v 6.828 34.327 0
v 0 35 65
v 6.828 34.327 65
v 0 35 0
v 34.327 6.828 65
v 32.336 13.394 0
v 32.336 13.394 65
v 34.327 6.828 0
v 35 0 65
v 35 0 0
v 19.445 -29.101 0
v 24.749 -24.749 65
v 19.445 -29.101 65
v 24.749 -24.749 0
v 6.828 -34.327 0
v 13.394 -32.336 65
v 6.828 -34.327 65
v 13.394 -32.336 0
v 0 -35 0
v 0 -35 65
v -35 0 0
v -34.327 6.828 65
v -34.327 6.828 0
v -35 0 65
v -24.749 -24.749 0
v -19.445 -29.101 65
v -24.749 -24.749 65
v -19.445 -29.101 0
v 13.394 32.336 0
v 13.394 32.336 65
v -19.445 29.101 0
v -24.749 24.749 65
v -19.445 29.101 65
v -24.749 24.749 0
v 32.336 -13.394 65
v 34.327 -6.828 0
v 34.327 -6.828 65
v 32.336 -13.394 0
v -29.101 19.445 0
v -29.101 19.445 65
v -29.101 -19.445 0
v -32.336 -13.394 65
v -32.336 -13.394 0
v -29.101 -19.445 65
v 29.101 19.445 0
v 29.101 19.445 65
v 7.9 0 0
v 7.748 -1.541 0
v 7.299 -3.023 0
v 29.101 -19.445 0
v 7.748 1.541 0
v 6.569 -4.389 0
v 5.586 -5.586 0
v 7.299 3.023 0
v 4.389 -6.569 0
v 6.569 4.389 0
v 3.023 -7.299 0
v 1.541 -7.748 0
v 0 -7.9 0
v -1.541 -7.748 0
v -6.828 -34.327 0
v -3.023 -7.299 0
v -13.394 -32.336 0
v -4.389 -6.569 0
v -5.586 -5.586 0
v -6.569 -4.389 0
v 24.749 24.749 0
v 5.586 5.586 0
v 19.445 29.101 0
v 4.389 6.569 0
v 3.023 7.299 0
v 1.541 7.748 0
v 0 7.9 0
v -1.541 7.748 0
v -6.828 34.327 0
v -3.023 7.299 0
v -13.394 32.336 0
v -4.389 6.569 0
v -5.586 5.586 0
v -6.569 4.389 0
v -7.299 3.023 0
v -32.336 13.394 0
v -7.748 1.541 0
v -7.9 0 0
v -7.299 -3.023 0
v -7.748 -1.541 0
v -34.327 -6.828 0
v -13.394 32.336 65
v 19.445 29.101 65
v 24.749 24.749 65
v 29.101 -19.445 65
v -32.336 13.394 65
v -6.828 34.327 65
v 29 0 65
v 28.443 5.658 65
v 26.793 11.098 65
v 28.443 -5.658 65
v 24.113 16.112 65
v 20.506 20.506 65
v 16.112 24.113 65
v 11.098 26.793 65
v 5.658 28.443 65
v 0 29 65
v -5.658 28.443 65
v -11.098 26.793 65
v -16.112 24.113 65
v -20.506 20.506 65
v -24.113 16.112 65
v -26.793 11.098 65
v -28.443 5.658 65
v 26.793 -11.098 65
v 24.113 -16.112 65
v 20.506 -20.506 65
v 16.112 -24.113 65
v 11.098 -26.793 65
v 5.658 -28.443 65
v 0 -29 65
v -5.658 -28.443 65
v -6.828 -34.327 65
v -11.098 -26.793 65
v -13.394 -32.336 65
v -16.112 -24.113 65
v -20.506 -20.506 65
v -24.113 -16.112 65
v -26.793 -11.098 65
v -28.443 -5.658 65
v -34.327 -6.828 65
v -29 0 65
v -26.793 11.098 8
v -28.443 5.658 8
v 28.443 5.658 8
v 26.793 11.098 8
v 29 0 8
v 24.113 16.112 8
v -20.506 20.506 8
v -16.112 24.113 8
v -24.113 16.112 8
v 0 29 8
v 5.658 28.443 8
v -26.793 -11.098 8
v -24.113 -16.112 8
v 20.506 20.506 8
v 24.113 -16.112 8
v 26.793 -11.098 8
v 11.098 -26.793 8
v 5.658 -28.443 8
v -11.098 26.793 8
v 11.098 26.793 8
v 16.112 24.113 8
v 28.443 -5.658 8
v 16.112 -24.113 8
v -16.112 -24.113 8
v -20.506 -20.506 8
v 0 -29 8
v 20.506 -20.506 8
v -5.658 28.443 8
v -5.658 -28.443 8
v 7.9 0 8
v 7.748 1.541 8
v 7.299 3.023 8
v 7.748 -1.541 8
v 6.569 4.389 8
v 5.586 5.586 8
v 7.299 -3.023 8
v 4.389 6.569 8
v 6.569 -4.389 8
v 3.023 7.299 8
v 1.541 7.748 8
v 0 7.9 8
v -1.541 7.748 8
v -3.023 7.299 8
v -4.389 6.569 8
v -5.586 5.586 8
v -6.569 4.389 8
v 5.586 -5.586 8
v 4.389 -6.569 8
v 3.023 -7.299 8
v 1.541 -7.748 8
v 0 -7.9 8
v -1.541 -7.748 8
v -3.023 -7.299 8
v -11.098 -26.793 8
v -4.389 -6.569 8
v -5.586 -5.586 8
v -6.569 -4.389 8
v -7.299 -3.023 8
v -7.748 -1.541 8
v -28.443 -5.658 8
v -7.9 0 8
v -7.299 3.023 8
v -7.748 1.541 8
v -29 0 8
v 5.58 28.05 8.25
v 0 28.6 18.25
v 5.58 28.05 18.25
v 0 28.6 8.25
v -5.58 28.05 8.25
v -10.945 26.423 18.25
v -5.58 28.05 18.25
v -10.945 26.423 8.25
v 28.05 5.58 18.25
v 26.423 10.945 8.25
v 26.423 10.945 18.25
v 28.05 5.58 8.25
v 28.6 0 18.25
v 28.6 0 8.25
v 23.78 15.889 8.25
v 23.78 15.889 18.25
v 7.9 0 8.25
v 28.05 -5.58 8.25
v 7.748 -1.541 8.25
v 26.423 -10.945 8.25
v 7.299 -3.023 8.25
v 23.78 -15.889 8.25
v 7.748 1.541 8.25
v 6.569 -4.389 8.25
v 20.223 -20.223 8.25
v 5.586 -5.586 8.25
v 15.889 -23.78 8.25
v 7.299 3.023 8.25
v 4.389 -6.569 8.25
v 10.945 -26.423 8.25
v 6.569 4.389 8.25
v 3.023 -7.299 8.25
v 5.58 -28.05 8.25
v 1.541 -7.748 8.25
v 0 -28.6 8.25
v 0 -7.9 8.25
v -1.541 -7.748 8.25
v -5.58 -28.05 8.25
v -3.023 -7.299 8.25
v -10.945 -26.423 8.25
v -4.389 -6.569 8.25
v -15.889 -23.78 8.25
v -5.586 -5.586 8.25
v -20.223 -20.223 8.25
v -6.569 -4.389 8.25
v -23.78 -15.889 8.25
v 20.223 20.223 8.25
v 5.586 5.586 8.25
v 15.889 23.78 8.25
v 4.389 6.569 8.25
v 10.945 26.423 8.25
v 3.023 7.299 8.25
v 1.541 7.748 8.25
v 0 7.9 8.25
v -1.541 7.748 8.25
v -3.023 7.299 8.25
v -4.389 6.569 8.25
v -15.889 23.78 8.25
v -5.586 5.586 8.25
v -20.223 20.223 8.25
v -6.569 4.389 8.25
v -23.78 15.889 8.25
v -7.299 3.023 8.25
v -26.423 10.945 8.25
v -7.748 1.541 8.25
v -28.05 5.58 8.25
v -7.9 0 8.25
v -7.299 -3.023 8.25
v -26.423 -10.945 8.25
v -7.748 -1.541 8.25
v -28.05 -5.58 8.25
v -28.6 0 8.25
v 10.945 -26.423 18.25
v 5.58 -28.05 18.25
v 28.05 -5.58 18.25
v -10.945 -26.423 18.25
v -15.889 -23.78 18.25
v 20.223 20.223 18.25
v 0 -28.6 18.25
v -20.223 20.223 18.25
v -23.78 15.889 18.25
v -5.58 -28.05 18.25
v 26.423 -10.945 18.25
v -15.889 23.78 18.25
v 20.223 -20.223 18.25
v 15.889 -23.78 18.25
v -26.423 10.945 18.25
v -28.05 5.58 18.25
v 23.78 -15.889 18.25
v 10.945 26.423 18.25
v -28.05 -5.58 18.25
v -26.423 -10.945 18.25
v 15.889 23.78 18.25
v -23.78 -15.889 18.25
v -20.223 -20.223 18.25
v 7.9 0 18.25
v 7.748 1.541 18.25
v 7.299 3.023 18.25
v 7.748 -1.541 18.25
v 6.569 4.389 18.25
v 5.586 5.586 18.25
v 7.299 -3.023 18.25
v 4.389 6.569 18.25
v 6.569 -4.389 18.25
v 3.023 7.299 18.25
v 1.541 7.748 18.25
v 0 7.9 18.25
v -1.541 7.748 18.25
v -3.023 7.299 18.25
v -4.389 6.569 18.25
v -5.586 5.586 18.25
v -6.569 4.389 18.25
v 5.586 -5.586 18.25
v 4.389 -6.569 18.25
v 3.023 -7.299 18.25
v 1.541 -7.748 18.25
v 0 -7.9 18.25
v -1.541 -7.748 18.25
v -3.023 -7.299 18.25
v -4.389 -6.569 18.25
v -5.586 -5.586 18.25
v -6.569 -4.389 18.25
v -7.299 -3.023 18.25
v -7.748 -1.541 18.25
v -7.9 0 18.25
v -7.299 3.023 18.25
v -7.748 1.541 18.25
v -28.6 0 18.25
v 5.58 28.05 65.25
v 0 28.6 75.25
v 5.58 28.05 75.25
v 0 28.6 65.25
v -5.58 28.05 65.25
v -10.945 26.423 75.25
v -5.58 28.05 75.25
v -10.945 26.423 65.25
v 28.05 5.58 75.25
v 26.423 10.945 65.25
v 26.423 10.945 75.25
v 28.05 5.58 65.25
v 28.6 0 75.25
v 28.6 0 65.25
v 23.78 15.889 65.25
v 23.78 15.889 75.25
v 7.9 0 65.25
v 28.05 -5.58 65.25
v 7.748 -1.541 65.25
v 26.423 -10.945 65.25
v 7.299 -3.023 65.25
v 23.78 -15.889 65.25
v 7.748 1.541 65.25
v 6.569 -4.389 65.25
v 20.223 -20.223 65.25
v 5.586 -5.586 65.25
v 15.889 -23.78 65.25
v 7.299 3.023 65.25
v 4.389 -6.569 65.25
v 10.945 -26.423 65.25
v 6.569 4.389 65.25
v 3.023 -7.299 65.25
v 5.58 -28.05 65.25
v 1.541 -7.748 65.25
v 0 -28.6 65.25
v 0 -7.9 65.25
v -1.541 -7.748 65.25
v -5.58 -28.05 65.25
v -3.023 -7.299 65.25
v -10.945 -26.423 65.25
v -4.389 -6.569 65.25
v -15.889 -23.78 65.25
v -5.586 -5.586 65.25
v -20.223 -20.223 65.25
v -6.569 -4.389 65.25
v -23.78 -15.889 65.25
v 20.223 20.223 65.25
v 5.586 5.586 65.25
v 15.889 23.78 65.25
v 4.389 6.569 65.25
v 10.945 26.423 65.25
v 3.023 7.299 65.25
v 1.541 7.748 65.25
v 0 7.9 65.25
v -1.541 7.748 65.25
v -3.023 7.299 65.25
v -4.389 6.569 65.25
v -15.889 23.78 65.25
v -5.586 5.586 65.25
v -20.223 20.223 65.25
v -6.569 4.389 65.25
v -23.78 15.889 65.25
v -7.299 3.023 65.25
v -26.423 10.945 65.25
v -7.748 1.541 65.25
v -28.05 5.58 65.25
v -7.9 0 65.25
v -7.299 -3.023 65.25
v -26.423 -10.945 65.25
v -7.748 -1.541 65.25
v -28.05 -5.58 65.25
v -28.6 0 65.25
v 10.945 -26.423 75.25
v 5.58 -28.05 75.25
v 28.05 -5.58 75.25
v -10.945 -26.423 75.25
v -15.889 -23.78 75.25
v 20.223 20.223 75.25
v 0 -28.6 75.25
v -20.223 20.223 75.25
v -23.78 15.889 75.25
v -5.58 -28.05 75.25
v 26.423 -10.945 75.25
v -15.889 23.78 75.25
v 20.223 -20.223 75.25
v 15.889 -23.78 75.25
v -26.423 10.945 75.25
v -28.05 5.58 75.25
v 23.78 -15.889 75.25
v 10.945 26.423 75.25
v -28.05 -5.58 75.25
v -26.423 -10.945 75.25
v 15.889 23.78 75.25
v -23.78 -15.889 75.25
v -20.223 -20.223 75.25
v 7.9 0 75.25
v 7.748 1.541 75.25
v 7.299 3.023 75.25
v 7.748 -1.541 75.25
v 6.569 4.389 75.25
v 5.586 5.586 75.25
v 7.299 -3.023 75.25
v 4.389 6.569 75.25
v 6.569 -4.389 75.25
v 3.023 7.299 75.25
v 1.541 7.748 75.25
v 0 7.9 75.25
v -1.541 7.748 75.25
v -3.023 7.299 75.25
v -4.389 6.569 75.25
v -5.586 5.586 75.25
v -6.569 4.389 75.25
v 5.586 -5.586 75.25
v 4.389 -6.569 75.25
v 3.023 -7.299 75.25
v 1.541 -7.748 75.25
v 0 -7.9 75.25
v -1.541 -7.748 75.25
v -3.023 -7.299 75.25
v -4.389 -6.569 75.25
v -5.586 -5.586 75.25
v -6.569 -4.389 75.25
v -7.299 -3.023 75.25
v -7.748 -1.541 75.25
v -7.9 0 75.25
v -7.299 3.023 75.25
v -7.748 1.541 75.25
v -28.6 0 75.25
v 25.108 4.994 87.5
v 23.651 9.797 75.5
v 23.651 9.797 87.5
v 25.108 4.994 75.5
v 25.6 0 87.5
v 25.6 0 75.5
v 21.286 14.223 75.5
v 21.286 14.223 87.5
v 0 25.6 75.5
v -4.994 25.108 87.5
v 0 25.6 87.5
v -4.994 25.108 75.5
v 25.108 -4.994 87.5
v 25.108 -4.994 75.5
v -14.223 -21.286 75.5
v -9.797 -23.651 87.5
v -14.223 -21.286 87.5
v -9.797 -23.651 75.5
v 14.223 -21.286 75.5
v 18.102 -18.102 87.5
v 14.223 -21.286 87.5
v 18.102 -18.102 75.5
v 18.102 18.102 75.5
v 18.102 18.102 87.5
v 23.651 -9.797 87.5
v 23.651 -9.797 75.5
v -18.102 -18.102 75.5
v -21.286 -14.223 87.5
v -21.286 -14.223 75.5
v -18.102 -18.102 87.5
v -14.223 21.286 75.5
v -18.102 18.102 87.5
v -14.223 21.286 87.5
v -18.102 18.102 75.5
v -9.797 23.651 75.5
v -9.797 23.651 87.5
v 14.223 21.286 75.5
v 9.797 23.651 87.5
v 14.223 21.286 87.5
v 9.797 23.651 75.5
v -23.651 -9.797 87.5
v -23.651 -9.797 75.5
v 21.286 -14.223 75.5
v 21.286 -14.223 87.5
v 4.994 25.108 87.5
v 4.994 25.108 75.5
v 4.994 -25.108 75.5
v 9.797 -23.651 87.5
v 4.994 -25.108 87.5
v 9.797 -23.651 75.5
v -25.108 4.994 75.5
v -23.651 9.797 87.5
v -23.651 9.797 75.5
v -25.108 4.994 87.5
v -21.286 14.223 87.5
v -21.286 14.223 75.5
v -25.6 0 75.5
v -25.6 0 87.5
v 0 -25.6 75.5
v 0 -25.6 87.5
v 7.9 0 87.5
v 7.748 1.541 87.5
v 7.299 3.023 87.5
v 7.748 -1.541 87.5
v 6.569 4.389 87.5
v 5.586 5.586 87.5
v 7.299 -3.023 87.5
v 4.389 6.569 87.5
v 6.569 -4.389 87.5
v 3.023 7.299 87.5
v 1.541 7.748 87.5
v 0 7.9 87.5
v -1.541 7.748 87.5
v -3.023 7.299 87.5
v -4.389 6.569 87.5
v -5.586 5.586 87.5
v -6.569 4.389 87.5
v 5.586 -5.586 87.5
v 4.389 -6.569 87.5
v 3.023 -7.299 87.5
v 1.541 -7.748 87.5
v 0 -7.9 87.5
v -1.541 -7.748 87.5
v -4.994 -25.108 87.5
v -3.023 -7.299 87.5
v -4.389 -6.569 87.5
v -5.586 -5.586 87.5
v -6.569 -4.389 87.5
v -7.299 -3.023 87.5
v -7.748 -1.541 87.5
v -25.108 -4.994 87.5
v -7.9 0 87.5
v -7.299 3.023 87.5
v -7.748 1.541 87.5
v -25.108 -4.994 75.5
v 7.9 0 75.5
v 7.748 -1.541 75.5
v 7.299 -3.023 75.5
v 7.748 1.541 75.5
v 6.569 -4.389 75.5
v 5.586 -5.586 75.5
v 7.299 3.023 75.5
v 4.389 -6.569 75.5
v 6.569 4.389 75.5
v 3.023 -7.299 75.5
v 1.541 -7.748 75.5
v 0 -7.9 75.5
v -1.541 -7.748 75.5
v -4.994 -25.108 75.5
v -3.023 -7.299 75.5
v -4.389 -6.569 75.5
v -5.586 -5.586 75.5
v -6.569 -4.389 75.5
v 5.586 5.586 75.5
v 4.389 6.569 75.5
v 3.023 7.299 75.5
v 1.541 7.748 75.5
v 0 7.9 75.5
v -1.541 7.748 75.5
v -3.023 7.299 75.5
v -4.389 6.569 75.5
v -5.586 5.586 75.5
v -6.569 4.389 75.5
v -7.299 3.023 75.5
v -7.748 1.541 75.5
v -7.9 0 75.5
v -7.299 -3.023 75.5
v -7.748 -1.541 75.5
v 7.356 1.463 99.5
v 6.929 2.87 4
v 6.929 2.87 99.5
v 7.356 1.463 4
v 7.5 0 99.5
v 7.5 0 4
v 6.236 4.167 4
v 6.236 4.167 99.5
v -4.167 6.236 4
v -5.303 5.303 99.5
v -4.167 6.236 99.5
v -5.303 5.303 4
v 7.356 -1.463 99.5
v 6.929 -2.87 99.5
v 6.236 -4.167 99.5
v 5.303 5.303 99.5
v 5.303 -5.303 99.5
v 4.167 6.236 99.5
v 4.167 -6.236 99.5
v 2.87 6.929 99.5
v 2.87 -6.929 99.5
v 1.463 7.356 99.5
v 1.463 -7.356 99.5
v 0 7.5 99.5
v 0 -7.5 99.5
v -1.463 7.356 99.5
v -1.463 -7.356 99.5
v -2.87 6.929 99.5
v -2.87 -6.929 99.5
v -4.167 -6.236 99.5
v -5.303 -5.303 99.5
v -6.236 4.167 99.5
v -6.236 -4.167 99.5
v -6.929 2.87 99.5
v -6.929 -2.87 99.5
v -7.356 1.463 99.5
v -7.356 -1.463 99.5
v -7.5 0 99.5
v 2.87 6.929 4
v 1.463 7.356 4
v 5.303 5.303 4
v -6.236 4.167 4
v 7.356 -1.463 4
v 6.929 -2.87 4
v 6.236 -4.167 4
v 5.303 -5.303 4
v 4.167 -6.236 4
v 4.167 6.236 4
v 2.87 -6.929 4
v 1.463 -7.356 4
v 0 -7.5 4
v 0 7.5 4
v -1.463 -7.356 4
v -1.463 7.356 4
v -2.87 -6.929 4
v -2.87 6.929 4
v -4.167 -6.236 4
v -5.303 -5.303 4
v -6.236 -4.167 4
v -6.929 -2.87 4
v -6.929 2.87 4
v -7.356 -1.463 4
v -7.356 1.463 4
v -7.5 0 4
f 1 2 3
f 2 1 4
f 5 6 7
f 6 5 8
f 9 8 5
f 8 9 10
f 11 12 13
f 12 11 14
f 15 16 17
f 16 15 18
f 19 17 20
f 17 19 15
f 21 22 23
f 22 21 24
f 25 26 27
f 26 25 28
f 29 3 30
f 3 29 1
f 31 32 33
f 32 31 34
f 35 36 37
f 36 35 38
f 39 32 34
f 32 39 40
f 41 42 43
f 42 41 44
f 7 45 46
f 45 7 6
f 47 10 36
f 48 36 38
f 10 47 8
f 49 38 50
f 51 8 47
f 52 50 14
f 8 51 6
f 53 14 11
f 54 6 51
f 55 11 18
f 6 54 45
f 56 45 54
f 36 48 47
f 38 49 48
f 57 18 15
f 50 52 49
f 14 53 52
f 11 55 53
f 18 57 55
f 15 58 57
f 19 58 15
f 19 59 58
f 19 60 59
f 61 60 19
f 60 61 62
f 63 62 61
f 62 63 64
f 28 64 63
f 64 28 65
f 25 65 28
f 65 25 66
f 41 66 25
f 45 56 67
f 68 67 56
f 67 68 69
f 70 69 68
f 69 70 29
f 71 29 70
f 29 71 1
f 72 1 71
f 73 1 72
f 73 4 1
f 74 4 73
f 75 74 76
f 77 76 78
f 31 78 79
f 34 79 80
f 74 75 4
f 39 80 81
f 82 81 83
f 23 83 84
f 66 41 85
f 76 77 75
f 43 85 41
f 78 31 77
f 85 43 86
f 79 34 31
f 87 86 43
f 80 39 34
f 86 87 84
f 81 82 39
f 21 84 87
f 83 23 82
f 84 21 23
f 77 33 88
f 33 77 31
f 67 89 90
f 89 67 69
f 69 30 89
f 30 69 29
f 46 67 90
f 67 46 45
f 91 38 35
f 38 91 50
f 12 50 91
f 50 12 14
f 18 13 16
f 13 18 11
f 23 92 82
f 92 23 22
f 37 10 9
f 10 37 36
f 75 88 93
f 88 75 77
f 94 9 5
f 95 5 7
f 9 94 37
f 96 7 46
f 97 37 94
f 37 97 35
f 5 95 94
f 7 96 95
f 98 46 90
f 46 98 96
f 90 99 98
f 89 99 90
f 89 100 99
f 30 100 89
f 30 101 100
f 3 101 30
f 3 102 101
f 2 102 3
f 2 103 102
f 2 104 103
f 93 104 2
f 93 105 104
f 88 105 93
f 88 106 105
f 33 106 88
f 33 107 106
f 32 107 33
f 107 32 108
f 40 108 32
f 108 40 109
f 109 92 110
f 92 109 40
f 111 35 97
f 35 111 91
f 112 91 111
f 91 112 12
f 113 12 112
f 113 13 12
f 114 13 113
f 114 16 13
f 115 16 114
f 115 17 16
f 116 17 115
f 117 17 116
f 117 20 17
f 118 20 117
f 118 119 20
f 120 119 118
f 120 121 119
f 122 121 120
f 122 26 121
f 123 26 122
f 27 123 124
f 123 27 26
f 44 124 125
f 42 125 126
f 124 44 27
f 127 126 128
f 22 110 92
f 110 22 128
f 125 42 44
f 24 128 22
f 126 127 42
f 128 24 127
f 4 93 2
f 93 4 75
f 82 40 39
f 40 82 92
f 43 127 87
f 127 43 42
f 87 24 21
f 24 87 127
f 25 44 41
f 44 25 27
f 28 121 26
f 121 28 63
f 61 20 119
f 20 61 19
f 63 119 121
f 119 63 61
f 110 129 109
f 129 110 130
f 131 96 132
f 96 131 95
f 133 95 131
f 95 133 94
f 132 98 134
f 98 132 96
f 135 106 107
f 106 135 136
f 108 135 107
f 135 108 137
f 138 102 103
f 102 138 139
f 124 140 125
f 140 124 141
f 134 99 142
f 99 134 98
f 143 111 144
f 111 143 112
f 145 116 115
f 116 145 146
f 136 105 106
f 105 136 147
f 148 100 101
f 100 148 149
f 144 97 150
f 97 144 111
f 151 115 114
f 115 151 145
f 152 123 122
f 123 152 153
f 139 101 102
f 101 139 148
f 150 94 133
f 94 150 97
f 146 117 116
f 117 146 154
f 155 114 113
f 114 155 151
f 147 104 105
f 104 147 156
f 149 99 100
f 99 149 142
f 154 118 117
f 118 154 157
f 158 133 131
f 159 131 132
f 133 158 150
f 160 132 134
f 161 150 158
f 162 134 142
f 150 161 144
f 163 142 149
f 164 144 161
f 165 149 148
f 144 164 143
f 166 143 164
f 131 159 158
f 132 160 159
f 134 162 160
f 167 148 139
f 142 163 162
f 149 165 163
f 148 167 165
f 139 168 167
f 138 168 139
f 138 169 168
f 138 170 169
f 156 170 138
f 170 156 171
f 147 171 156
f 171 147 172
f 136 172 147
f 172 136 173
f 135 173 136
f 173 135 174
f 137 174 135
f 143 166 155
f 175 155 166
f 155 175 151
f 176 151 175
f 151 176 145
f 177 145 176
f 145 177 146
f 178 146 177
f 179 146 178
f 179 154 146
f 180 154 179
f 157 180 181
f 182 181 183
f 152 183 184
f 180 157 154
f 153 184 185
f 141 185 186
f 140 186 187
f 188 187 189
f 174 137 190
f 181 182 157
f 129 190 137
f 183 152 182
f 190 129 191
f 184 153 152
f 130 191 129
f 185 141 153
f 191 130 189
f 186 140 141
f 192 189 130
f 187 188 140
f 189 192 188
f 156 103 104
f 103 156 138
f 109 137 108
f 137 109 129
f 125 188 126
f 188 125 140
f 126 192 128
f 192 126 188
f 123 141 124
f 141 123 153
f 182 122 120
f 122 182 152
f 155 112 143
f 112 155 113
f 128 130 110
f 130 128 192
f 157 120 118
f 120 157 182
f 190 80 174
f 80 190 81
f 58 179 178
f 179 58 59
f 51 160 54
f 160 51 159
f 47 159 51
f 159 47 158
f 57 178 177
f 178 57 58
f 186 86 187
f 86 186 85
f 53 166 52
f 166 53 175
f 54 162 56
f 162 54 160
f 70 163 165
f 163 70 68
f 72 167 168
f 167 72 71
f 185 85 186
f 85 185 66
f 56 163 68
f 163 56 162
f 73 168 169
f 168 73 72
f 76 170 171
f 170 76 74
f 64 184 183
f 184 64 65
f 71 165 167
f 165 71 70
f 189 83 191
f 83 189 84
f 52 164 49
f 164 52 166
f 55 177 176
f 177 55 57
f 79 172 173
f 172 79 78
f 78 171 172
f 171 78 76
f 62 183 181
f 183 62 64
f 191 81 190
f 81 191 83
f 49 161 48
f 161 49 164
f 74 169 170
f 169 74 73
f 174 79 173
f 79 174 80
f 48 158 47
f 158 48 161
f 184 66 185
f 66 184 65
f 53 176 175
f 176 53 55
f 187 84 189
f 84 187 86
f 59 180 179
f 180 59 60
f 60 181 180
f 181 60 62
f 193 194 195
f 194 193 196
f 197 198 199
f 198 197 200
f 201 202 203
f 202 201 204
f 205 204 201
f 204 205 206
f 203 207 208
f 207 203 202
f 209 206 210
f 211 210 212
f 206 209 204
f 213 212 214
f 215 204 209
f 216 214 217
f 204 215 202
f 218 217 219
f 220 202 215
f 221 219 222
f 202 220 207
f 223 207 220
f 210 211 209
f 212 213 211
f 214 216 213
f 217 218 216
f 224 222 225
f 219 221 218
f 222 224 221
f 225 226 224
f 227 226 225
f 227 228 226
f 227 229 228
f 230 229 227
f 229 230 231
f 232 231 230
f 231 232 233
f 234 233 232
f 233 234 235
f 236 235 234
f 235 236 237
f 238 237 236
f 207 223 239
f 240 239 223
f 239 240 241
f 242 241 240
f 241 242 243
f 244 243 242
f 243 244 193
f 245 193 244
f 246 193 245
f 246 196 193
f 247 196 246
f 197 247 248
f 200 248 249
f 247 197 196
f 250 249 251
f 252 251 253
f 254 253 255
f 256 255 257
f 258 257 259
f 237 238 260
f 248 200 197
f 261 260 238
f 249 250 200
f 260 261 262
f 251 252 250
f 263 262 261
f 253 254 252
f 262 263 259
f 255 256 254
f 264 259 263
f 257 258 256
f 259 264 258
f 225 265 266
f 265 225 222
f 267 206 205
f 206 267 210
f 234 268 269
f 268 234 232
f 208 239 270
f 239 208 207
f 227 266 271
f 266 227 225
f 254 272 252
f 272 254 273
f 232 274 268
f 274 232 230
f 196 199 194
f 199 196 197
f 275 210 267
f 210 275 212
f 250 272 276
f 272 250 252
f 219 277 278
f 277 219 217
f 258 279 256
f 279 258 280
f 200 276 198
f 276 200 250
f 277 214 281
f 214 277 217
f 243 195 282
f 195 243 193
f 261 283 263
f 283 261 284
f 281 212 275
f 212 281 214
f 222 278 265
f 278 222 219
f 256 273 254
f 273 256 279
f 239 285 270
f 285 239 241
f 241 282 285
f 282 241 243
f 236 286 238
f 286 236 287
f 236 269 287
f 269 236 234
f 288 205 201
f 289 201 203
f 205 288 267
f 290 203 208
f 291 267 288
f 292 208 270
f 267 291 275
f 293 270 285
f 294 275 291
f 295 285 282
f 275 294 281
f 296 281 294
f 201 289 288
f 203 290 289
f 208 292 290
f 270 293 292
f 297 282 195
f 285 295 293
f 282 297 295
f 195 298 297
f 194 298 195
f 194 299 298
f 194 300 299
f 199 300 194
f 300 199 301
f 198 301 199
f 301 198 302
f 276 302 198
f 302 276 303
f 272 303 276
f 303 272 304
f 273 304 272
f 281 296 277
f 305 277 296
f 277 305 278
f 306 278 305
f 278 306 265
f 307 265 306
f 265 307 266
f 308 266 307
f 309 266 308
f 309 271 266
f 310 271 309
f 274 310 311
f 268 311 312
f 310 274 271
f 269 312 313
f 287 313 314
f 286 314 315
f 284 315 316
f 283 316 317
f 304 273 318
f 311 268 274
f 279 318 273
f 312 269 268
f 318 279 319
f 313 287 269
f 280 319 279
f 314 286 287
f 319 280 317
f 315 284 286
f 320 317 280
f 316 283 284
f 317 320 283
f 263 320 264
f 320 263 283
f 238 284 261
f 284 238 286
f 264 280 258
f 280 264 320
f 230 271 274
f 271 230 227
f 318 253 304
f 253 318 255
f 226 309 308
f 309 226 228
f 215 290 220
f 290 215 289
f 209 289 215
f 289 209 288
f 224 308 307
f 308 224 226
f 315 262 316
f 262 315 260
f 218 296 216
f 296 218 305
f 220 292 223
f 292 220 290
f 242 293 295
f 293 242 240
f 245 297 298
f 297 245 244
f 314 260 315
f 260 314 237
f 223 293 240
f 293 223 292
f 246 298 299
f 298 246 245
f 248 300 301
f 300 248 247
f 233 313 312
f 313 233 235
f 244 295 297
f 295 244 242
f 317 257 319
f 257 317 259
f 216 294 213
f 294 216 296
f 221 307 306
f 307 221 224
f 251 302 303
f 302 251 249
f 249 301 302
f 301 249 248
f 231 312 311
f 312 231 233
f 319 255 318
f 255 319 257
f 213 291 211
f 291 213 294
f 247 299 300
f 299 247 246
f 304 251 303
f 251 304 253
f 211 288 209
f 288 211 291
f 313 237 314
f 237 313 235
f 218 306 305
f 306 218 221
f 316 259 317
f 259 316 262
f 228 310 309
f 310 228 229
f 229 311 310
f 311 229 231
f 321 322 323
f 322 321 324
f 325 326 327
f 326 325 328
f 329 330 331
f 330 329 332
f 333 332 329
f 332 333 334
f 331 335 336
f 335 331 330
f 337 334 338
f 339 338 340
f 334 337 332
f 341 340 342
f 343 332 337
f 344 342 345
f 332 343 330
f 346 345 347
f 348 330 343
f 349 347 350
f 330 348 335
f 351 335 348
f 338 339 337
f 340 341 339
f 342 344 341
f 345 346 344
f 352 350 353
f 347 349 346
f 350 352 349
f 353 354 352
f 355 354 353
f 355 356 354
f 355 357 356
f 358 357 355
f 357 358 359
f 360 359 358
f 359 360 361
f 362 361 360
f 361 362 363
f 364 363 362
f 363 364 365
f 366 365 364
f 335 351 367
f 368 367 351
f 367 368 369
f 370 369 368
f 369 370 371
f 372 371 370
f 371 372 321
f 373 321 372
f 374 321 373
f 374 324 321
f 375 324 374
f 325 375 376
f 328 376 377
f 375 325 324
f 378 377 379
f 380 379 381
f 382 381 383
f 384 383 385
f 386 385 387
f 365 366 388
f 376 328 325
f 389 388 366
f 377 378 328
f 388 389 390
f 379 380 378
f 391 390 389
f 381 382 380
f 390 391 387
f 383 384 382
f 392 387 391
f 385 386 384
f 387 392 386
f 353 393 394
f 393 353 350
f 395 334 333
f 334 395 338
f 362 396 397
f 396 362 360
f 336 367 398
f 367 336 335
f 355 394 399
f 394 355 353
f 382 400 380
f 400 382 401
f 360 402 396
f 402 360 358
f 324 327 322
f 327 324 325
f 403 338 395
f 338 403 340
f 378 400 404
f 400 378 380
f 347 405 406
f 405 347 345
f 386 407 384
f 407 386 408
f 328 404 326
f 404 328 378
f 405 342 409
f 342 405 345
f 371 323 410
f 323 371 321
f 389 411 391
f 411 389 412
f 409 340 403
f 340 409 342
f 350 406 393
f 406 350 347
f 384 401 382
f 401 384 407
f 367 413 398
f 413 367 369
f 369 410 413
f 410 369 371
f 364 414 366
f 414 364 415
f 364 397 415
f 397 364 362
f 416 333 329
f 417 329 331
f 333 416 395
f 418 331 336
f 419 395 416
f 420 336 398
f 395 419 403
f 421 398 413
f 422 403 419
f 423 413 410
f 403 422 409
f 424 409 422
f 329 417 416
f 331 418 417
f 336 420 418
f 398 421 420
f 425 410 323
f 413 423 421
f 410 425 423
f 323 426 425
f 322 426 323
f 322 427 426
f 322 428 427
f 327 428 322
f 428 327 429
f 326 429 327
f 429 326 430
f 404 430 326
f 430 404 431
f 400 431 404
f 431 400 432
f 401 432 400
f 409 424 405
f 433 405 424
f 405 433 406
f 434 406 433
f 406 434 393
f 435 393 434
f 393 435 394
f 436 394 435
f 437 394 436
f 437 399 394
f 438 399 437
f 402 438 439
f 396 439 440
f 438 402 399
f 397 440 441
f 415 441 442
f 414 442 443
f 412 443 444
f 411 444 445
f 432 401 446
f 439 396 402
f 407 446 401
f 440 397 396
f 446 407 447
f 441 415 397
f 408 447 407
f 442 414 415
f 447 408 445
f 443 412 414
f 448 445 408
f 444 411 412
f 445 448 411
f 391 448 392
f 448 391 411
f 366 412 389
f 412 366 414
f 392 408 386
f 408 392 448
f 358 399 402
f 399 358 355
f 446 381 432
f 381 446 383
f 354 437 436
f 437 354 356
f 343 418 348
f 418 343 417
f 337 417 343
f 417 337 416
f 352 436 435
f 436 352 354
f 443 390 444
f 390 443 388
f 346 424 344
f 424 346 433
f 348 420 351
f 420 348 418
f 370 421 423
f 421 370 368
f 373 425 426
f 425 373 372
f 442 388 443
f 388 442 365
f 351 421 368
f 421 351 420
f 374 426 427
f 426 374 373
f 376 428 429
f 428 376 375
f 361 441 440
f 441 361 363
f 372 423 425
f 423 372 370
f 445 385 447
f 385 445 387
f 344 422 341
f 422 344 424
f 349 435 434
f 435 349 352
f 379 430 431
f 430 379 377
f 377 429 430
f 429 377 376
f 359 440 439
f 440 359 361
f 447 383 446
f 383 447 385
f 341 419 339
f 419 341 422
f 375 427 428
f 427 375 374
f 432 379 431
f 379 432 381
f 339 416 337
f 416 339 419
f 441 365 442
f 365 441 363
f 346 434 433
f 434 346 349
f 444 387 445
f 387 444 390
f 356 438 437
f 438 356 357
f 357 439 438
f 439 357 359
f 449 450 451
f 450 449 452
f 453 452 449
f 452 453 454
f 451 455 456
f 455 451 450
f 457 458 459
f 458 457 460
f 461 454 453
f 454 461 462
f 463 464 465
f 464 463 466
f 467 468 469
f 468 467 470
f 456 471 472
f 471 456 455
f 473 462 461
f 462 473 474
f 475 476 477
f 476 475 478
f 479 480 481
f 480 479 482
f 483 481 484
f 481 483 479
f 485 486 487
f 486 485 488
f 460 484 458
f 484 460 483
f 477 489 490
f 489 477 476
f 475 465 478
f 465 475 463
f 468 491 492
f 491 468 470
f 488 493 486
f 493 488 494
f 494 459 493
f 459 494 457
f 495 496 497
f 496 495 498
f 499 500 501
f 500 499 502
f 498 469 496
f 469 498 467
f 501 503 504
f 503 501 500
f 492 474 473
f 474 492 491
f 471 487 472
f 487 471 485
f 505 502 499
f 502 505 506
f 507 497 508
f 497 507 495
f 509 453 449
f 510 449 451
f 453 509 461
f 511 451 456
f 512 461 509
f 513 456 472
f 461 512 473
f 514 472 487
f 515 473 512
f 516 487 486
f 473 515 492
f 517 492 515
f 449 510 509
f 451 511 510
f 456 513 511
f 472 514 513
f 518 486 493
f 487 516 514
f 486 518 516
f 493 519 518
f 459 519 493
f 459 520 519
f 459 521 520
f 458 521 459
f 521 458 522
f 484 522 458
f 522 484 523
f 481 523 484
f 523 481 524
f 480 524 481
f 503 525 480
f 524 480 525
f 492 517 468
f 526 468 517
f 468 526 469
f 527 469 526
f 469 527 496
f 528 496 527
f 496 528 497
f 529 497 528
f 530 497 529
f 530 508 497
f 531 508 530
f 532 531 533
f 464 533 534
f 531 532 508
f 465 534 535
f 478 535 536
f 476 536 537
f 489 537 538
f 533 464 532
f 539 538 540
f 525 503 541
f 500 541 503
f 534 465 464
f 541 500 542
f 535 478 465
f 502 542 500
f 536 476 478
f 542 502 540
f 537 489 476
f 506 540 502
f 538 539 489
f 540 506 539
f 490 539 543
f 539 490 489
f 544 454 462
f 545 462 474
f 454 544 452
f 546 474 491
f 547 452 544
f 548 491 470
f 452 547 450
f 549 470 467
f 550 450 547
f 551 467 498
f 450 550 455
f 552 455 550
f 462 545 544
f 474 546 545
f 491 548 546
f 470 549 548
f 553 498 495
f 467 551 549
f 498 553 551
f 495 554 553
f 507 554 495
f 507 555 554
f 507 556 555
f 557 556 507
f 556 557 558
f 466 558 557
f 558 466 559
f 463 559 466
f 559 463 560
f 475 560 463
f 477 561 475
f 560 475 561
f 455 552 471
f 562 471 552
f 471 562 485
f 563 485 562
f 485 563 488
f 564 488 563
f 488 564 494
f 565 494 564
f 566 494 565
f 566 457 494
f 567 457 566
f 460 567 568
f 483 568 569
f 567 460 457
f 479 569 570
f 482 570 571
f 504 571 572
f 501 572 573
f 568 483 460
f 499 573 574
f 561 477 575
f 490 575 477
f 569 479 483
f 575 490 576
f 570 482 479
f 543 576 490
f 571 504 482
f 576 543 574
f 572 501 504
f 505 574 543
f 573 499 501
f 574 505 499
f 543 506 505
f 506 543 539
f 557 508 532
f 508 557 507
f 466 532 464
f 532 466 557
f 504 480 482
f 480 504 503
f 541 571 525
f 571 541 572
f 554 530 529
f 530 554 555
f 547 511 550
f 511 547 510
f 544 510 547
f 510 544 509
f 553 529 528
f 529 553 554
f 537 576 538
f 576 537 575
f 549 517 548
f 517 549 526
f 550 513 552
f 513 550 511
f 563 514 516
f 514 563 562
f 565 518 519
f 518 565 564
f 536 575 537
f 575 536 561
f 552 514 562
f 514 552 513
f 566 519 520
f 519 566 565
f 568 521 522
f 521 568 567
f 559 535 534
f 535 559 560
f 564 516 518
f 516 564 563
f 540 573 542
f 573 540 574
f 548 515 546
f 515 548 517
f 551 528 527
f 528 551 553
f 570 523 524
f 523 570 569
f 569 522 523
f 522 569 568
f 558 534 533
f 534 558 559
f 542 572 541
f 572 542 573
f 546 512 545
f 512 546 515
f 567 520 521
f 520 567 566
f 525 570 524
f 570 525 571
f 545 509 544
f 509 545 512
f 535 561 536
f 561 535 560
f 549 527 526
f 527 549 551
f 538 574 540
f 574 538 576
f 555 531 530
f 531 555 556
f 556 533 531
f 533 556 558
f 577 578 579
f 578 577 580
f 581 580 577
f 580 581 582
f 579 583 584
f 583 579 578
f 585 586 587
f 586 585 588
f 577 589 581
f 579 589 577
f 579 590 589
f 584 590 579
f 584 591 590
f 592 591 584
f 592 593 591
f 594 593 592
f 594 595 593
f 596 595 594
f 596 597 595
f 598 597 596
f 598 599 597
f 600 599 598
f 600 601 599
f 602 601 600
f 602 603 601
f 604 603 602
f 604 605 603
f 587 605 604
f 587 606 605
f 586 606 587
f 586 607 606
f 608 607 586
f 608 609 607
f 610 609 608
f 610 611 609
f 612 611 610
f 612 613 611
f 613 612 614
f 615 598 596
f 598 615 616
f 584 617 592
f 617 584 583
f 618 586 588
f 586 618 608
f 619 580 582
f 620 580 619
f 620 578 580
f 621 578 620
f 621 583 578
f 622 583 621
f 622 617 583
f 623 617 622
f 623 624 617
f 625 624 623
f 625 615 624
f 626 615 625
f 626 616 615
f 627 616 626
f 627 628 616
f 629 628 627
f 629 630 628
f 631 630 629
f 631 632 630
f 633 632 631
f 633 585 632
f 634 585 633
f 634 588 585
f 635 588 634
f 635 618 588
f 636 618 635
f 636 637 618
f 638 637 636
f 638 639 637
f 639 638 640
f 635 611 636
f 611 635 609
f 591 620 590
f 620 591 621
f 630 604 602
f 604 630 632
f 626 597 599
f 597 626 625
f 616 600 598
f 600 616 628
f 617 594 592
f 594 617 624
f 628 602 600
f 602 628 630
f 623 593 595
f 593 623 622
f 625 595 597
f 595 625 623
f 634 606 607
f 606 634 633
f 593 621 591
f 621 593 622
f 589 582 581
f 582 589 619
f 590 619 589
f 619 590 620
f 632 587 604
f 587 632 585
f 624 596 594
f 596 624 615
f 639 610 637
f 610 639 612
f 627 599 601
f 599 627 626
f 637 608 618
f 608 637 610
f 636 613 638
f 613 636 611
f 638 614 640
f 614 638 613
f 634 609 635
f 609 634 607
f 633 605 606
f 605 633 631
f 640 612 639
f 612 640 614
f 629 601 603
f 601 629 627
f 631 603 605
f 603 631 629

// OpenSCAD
$fn = 32;

// ------------------------------------------------------------------------
// Bearing housing: housing d70, two bearings and a shaft
// Every part is its own module, assembly() places them once.
// ------------------------------------------------------------------------

// --- part 1 ---
module housing() {
  difference() {
    cylinder(h = 65, d = 70);
    translate([0, 0, 8]) cylinder(h = 58, d = 58);
    translate([0, 0, -1]) cylinder(h = 10, d = 15.8);
  }
}

// --- part 2 ---
module bearing_lower() {
  difference() {
      translate([0, 0, 0]) cylinder(h = 10, d = 57.2);
      translate([0, 0, -1]) cylinder(h = 12, d = 15.8);
    }
}

// --- part 3 ---
module bearing_upper() {
  difference() {
      translate([0, 0, 0]) cylinder(h = 10, d = 57.2);
      translate([0, 0, -1]) cylinder(h = 12, d = 15.8);
    }
}

// --- part 4 ---
module spacer() {
  difference() {
      translate([0, 0, 0]) cylinder(h = 12, d = 51.2);
      translate([0, 0, -1]) cylinder(h = 14, d = 15.8);
    }
}

// --- part 5 ---
module shaft() {
  translate([0, 0, -47.75]) cylinder(h = 95.5, d = 15);
}

// --- assembly ---
module assembly() {
  translate([0, 0, 0]) rotate([0, 0, 0]) housing();
  translate([0, 0, 8.25]) rotate([0, 0, 0]) bearing_lower();
  translate([0, 0, 65.25]) rotate([0, 0, 0]) bearing_upper();
  translate([0, 0, 75.5]) rotate([0, 0, 0]) spacer();
  translate([0, 0, 51.75]) rotate([0, 0, 0]) shaft();
}

assembly();
